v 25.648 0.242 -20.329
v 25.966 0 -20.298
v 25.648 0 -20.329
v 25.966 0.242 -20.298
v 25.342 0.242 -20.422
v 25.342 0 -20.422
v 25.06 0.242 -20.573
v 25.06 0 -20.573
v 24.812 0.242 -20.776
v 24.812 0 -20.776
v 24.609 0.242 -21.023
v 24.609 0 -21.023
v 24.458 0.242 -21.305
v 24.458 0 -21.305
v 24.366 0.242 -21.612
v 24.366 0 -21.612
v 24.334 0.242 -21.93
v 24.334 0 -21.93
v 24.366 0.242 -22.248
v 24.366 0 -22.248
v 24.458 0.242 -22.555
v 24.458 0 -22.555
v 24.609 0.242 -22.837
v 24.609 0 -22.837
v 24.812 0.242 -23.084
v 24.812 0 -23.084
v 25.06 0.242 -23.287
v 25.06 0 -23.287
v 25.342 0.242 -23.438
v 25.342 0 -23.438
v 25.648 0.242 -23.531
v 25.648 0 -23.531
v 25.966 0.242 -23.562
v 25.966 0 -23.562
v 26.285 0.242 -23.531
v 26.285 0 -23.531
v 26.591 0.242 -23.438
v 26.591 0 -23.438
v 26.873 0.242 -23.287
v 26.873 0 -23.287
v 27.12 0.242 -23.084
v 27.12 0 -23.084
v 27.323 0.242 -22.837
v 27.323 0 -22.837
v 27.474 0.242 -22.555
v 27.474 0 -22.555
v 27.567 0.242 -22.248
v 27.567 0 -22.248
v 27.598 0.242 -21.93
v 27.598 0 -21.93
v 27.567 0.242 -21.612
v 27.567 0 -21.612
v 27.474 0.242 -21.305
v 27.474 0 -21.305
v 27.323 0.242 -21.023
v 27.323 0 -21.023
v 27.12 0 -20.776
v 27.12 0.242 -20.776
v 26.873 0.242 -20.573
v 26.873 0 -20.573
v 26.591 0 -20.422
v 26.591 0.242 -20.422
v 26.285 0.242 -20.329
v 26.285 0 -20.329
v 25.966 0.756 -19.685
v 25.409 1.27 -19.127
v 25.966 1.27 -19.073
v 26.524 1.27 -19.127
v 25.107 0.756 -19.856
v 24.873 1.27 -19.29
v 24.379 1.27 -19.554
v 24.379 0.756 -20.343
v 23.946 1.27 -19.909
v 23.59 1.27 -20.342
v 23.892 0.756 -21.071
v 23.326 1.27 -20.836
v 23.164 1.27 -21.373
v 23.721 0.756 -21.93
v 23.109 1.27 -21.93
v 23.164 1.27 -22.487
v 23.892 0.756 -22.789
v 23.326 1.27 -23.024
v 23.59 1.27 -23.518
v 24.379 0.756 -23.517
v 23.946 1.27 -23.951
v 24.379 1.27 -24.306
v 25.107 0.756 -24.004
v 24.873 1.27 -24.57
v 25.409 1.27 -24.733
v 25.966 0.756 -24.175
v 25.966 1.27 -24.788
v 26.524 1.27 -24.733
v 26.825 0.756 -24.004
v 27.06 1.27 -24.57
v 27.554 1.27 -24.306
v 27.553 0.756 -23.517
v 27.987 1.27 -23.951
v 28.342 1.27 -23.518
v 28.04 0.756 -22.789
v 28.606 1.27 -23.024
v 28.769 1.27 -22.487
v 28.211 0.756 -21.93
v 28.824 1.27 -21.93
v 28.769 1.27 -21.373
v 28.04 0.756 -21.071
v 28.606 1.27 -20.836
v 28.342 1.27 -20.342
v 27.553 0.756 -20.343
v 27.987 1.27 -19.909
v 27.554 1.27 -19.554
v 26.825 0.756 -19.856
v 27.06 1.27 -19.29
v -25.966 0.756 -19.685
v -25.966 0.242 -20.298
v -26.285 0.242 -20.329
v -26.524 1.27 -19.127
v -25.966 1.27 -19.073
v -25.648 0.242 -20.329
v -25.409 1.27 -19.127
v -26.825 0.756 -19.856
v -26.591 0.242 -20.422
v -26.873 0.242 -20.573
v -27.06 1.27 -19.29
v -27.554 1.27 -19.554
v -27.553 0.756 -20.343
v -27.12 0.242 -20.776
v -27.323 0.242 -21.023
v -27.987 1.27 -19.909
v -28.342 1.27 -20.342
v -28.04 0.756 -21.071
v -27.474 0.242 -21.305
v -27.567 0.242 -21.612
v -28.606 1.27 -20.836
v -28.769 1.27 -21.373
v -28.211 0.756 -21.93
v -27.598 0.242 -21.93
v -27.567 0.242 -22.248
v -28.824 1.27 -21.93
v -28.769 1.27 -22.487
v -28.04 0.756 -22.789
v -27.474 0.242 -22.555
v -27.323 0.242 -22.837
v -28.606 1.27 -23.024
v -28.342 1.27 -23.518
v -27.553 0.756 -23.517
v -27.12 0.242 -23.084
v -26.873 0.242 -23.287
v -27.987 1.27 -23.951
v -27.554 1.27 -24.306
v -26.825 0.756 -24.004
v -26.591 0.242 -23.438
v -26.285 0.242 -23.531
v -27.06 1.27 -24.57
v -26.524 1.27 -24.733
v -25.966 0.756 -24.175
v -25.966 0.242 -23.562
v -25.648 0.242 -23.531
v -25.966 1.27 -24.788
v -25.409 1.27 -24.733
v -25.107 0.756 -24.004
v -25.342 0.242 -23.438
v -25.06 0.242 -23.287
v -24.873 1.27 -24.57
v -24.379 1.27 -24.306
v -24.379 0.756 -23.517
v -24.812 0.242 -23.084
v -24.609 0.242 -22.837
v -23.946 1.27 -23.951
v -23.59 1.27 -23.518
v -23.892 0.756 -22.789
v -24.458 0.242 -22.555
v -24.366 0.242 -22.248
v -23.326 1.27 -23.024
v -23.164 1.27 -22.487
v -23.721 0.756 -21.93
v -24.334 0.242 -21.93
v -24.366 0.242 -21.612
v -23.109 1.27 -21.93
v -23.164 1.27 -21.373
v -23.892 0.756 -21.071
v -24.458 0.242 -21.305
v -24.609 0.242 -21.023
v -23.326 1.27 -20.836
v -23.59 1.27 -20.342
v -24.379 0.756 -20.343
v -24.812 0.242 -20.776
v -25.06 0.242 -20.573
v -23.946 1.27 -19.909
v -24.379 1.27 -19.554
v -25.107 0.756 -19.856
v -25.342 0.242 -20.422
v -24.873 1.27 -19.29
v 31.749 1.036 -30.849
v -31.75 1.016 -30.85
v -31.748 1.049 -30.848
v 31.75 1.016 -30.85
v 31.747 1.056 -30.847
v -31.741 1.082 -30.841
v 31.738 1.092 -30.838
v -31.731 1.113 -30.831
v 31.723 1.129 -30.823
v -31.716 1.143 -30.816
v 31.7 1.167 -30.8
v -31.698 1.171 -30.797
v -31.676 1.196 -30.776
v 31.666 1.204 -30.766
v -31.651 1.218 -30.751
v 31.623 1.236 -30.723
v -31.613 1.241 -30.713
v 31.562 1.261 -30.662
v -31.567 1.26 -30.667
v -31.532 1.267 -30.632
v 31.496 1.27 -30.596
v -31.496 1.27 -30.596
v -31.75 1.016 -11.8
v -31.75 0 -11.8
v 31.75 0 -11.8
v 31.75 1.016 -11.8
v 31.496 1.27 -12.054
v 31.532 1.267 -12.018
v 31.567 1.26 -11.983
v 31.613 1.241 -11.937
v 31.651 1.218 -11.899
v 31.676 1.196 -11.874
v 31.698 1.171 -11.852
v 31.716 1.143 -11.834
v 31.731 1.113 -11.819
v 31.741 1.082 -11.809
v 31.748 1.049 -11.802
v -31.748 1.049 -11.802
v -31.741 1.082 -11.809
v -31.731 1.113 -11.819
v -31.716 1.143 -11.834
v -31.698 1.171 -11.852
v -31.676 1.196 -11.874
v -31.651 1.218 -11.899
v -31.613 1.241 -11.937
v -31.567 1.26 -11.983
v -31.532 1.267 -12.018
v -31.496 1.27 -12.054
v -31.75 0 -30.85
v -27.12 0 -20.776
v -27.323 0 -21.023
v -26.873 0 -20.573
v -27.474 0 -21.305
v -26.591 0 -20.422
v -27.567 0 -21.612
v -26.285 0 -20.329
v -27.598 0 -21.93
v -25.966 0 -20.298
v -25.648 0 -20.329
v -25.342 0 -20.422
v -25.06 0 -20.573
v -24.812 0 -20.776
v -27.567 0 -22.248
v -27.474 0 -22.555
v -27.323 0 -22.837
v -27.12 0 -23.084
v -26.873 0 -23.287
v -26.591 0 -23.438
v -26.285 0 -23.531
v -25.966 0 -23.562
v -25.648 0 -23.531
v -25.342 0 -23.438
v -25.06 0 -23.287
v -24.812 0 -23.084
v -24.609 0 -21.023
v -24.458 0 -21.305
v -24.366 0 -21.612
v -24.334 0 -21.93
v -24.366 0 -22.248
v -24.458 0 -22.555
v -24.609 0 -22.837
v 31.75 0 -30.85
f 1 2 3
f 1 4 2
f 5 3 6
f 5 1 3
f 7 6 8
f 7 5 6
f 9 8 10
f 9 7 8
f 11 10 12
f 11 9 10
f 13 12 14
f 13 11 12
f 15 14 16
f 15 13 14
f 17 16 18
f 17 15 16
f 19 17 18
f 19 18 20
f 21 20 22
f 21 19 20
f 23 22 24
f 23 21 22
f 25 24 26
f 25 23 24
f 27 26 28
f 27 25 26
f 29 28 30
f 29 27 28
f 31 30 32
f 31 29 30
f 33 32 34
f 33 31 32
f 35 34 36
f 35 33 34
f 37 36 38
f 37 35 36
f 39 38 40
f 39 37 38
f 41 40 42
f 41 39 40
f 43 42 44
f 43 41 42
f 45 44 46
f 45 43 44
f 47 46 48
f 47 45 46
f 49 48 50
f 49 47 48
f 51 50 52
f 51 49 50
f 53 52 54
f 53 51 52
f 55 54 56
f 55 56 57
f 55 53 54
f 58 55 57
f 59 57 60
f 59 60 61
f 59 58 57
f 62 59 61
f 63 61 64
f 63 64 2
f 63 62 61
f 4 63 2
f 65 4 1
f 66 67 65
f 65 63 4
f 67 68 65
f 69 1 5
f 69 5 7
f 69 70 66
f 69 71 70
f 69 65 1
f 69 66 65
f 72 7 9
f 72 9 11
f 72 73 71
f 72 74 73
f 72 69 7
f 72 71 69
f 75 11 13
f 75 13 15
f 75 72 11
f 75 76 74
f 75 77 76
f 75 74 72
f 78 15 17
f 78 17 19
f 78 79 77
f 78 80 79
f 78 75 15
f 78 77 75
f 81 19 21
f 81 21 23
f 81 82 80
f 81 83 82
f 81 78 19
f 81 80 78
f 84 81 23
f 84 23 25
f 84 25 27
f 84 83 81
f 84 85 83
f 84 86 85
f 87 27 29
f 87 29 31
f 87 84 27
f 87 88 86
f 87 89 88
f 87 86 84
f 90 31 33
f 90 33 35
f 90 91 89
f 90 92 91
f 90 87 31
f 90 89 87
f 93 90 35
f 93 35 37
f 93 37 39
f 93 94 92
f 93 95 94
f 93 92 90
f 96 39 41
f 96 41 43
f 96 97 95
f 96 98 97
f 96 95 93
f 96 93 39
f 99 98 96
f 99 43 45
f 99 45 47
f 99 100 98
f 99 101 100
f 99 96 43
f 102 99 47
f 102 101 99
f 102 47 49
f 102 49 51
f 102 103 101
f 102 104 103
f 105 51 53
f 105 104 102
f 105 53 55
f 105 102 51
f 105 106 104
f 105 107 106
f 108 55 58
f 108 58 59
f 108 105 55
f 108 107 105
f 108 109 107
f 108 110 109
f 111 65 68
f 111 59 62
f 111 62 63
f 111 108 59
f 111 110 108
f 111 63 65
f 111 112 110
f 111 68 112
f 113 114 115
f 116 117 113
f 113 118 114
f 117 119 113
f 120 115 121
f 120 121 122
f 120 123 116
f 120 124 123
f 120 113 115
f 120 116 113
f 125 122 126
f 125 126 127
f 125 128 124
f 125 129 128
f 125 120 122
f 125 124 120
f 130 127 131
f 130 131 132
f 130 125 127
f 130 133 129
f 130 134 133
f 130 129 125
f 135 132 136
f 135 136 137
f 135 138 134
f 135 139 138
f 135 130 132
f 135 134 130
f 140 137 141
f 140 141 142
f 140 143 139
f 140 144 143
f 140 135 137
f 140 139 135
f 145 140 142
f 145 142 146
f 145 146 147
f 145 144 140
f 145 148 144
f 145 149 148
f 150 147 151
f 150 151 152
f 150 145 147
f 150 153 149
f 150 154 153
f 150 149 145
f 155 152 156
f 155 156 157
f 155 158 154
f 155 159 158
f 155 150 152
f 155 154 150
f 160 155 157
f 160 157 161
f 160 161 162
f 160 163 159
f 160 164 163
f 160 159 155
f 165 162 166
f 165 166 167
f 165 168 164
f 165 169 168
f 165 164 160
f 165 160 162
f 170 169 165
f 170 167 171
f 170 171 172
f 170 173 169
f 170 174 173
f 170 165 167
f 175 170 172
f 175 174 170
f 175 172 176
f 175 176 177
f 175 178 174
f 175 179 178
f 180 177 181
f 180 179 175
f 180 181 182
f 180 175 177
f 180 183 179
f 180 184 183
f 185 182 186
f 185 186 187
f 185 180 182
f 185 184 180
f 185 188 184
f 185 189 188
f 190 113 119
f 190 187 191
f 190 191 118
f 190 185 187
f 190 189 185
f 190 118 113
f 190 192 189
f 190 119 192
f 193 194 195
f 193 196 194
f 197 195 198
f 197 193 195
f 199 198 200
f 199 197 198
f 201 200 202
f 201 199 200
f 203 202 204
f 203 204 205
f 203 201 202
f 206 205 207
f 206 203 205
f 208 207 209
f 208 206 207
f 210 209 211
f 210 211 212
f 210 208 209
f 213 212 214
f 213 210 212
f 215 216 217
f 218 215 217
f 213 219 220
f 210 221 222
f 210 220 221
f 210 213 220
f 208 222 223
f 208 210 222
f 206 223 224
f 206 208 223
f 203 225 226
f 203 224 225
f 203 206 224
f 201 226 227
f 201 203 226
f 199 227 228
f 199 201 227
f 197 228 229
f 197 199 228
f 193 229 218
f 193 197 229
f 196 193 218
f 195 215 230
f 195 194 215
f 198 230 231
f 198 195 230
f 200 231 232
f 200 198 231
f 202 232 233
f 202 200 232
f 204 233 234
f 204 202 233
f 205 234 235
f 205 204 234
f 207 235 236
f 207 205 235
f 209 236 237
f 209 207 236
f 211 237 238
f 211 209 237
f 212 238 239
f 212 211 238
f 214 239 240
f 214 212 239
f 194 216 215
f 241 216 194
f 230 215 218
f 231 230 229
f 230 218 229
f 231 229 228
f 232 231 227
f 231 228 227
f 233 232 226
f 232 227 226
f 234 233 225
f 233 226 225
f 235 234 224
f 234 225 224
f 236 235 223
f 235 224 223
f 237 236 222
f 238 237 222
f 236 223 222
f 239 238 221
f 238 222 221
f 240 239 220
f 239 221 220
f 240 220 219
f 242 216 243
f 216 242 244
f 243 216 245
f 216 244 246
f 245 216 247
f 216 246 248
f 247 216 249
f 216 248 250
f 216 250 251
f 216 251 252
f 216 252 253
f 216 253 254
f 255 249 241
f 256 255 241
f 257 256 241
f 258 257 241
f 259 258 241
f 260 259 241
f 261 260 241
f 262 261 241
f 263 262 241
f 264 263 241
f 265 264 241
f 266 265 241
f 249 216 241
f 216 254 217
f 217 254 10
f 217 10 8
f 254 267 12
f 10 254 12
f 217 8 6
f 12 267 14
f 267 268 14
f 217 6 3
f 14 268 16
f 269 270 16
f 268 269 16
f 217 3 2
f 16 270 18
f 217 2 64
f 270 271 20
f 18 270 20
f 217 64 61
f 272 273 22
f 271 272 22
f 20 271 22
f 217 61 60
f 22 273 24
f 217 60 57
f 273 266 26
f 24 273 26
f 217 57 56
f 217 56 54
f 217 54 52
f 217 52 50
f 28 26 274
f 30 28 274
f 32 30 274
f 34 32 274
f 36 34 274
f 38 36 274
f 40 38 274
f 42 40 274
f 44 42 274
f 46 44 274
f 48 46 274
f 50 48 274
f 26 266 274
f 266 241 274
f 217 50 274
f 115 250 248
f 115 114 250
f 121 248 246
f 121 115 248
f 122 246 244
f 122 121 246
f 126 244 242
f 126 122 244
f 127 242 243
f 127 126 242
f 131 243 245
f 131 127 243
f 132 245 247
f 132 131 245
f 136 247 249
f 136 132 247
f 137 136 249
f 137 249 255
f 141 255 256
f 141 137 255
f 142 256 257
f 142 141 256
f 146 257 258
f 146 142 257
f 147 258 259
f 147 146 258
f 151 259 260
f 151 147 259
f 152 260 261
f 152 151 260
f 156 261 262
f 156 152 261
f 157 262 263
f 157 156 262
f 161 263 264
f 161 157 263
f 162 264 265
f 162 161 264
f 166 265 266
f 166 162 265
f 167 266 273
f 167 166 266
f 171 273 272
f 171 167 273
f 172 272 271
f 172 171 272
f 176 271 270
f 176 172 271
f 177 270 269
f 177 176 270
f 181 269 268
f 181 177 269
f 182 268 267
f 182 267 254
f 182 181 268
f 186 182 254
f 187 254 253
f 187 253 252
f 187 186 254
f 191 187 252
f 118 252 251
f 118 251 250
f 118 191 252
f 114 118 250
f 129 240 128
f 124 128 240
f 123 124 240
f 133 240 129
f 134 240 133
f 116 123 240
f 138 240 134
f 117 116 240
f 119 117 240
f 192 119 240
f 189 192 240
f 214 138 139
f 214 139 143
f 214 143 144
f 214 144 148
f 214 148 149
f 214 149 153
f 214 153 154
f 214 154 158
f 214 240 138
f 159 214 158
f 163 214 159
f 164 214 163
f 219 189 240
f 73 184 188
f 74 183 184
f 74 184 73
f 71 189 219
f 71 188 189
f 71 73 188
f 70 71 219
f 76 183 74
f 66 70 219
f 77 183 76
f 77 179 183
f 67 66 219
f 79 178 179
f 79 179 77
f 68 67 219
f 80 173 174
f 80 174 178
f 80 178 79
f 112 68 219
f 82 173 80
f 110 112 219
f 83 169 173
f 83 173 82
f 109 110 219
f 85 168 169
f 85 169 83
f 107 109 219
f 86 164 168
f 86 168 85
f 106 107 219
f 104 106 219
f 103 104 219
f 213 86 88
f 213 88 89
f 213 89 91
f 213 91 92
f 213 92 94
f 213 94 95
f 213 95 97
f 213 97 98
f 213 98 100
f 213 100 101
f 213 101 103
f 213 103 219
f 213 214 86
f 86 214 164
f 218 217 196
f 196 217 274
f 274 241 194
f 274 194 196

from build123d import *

# Parameters (mm, degrees)
SKETCH1_W                                 = 63.5
SKETCH1_H                                 = 19.05
BOSS_EXTRUDE1_DEPTH                       = 1.27
CSK_FOR_4_FLAT_HEAD_MACHINE_SCREW_2_COUNT = 2
CSK_FOR_4_FLAT_HEAD_MACHINE_SCREW_2_PITCH = 51.93240976
FILLET2_R                                 = 0.254


with BuildPart() as part:
    # Sketch1 → Boss-Extrude1 (new body)
    with BuildSketch(Plane(origin=(0, 0, 0), x_dir=(1, 0, 0), z_dir=(0, 1, 0))):
        with Locations((0, 21.324911643)):
            Rectangle(SKETCH1_W, SKETCH1_H)
    extrude(amount=BOSS_EXTRUDE1_DEPTH)

    # Sketch15 → CSK for #4 Flat Head Machine Screw (100)2 (revolve, cut)
    with BuildSketch(Plane(origin=(-25.96620488, 1.27, -21.930009473), x_dir=(0, 0, 1), z_dir=(1, 0, 0))):
        Polygon((0, 0), (0, 1.27), (1.63195, 1.27), (1.63195, 1.028358553), (2.8575, 0), align=None)
    csk_for_4_flat_head_machine_screw_100 = revolve(axis=Axis((-25.96620488, 7.62, -21.930009473), (0, -1, 0)), mode=Mode.SUBTRACT)

    # CSK for _4 Flat Head Machine Screw _ 2: CSK for #4 Flat Head Machine Screw (100)2 ×2
    with Locations(*[(i * CSK_FOR_4_FLAT_HEAD_MACHINE_SCREW_2_PITCH, 0, 0) for i in range(1, CSK_FOR_4_FLAT_HEAD_MACHINE_SCREW_2_COUNT)]):
        add(csk_for_4_flat_head_machine_screw_100, mode=Mode.SUBTRACT)

    # Fillet2
    fillet2_edges = [part.edges().sort_by_distance(p)[0] for p in [
        (-31.75, 1.27, -21.324911643),
        (0, 1.27, -11.799911643),
        (31.75, 1.27, -21.324911643),
        (0, 1.27, -30.849911643),
    ]]
    fillet(fillet2_edges, radius=FILLET2_R)


solid = part.part
